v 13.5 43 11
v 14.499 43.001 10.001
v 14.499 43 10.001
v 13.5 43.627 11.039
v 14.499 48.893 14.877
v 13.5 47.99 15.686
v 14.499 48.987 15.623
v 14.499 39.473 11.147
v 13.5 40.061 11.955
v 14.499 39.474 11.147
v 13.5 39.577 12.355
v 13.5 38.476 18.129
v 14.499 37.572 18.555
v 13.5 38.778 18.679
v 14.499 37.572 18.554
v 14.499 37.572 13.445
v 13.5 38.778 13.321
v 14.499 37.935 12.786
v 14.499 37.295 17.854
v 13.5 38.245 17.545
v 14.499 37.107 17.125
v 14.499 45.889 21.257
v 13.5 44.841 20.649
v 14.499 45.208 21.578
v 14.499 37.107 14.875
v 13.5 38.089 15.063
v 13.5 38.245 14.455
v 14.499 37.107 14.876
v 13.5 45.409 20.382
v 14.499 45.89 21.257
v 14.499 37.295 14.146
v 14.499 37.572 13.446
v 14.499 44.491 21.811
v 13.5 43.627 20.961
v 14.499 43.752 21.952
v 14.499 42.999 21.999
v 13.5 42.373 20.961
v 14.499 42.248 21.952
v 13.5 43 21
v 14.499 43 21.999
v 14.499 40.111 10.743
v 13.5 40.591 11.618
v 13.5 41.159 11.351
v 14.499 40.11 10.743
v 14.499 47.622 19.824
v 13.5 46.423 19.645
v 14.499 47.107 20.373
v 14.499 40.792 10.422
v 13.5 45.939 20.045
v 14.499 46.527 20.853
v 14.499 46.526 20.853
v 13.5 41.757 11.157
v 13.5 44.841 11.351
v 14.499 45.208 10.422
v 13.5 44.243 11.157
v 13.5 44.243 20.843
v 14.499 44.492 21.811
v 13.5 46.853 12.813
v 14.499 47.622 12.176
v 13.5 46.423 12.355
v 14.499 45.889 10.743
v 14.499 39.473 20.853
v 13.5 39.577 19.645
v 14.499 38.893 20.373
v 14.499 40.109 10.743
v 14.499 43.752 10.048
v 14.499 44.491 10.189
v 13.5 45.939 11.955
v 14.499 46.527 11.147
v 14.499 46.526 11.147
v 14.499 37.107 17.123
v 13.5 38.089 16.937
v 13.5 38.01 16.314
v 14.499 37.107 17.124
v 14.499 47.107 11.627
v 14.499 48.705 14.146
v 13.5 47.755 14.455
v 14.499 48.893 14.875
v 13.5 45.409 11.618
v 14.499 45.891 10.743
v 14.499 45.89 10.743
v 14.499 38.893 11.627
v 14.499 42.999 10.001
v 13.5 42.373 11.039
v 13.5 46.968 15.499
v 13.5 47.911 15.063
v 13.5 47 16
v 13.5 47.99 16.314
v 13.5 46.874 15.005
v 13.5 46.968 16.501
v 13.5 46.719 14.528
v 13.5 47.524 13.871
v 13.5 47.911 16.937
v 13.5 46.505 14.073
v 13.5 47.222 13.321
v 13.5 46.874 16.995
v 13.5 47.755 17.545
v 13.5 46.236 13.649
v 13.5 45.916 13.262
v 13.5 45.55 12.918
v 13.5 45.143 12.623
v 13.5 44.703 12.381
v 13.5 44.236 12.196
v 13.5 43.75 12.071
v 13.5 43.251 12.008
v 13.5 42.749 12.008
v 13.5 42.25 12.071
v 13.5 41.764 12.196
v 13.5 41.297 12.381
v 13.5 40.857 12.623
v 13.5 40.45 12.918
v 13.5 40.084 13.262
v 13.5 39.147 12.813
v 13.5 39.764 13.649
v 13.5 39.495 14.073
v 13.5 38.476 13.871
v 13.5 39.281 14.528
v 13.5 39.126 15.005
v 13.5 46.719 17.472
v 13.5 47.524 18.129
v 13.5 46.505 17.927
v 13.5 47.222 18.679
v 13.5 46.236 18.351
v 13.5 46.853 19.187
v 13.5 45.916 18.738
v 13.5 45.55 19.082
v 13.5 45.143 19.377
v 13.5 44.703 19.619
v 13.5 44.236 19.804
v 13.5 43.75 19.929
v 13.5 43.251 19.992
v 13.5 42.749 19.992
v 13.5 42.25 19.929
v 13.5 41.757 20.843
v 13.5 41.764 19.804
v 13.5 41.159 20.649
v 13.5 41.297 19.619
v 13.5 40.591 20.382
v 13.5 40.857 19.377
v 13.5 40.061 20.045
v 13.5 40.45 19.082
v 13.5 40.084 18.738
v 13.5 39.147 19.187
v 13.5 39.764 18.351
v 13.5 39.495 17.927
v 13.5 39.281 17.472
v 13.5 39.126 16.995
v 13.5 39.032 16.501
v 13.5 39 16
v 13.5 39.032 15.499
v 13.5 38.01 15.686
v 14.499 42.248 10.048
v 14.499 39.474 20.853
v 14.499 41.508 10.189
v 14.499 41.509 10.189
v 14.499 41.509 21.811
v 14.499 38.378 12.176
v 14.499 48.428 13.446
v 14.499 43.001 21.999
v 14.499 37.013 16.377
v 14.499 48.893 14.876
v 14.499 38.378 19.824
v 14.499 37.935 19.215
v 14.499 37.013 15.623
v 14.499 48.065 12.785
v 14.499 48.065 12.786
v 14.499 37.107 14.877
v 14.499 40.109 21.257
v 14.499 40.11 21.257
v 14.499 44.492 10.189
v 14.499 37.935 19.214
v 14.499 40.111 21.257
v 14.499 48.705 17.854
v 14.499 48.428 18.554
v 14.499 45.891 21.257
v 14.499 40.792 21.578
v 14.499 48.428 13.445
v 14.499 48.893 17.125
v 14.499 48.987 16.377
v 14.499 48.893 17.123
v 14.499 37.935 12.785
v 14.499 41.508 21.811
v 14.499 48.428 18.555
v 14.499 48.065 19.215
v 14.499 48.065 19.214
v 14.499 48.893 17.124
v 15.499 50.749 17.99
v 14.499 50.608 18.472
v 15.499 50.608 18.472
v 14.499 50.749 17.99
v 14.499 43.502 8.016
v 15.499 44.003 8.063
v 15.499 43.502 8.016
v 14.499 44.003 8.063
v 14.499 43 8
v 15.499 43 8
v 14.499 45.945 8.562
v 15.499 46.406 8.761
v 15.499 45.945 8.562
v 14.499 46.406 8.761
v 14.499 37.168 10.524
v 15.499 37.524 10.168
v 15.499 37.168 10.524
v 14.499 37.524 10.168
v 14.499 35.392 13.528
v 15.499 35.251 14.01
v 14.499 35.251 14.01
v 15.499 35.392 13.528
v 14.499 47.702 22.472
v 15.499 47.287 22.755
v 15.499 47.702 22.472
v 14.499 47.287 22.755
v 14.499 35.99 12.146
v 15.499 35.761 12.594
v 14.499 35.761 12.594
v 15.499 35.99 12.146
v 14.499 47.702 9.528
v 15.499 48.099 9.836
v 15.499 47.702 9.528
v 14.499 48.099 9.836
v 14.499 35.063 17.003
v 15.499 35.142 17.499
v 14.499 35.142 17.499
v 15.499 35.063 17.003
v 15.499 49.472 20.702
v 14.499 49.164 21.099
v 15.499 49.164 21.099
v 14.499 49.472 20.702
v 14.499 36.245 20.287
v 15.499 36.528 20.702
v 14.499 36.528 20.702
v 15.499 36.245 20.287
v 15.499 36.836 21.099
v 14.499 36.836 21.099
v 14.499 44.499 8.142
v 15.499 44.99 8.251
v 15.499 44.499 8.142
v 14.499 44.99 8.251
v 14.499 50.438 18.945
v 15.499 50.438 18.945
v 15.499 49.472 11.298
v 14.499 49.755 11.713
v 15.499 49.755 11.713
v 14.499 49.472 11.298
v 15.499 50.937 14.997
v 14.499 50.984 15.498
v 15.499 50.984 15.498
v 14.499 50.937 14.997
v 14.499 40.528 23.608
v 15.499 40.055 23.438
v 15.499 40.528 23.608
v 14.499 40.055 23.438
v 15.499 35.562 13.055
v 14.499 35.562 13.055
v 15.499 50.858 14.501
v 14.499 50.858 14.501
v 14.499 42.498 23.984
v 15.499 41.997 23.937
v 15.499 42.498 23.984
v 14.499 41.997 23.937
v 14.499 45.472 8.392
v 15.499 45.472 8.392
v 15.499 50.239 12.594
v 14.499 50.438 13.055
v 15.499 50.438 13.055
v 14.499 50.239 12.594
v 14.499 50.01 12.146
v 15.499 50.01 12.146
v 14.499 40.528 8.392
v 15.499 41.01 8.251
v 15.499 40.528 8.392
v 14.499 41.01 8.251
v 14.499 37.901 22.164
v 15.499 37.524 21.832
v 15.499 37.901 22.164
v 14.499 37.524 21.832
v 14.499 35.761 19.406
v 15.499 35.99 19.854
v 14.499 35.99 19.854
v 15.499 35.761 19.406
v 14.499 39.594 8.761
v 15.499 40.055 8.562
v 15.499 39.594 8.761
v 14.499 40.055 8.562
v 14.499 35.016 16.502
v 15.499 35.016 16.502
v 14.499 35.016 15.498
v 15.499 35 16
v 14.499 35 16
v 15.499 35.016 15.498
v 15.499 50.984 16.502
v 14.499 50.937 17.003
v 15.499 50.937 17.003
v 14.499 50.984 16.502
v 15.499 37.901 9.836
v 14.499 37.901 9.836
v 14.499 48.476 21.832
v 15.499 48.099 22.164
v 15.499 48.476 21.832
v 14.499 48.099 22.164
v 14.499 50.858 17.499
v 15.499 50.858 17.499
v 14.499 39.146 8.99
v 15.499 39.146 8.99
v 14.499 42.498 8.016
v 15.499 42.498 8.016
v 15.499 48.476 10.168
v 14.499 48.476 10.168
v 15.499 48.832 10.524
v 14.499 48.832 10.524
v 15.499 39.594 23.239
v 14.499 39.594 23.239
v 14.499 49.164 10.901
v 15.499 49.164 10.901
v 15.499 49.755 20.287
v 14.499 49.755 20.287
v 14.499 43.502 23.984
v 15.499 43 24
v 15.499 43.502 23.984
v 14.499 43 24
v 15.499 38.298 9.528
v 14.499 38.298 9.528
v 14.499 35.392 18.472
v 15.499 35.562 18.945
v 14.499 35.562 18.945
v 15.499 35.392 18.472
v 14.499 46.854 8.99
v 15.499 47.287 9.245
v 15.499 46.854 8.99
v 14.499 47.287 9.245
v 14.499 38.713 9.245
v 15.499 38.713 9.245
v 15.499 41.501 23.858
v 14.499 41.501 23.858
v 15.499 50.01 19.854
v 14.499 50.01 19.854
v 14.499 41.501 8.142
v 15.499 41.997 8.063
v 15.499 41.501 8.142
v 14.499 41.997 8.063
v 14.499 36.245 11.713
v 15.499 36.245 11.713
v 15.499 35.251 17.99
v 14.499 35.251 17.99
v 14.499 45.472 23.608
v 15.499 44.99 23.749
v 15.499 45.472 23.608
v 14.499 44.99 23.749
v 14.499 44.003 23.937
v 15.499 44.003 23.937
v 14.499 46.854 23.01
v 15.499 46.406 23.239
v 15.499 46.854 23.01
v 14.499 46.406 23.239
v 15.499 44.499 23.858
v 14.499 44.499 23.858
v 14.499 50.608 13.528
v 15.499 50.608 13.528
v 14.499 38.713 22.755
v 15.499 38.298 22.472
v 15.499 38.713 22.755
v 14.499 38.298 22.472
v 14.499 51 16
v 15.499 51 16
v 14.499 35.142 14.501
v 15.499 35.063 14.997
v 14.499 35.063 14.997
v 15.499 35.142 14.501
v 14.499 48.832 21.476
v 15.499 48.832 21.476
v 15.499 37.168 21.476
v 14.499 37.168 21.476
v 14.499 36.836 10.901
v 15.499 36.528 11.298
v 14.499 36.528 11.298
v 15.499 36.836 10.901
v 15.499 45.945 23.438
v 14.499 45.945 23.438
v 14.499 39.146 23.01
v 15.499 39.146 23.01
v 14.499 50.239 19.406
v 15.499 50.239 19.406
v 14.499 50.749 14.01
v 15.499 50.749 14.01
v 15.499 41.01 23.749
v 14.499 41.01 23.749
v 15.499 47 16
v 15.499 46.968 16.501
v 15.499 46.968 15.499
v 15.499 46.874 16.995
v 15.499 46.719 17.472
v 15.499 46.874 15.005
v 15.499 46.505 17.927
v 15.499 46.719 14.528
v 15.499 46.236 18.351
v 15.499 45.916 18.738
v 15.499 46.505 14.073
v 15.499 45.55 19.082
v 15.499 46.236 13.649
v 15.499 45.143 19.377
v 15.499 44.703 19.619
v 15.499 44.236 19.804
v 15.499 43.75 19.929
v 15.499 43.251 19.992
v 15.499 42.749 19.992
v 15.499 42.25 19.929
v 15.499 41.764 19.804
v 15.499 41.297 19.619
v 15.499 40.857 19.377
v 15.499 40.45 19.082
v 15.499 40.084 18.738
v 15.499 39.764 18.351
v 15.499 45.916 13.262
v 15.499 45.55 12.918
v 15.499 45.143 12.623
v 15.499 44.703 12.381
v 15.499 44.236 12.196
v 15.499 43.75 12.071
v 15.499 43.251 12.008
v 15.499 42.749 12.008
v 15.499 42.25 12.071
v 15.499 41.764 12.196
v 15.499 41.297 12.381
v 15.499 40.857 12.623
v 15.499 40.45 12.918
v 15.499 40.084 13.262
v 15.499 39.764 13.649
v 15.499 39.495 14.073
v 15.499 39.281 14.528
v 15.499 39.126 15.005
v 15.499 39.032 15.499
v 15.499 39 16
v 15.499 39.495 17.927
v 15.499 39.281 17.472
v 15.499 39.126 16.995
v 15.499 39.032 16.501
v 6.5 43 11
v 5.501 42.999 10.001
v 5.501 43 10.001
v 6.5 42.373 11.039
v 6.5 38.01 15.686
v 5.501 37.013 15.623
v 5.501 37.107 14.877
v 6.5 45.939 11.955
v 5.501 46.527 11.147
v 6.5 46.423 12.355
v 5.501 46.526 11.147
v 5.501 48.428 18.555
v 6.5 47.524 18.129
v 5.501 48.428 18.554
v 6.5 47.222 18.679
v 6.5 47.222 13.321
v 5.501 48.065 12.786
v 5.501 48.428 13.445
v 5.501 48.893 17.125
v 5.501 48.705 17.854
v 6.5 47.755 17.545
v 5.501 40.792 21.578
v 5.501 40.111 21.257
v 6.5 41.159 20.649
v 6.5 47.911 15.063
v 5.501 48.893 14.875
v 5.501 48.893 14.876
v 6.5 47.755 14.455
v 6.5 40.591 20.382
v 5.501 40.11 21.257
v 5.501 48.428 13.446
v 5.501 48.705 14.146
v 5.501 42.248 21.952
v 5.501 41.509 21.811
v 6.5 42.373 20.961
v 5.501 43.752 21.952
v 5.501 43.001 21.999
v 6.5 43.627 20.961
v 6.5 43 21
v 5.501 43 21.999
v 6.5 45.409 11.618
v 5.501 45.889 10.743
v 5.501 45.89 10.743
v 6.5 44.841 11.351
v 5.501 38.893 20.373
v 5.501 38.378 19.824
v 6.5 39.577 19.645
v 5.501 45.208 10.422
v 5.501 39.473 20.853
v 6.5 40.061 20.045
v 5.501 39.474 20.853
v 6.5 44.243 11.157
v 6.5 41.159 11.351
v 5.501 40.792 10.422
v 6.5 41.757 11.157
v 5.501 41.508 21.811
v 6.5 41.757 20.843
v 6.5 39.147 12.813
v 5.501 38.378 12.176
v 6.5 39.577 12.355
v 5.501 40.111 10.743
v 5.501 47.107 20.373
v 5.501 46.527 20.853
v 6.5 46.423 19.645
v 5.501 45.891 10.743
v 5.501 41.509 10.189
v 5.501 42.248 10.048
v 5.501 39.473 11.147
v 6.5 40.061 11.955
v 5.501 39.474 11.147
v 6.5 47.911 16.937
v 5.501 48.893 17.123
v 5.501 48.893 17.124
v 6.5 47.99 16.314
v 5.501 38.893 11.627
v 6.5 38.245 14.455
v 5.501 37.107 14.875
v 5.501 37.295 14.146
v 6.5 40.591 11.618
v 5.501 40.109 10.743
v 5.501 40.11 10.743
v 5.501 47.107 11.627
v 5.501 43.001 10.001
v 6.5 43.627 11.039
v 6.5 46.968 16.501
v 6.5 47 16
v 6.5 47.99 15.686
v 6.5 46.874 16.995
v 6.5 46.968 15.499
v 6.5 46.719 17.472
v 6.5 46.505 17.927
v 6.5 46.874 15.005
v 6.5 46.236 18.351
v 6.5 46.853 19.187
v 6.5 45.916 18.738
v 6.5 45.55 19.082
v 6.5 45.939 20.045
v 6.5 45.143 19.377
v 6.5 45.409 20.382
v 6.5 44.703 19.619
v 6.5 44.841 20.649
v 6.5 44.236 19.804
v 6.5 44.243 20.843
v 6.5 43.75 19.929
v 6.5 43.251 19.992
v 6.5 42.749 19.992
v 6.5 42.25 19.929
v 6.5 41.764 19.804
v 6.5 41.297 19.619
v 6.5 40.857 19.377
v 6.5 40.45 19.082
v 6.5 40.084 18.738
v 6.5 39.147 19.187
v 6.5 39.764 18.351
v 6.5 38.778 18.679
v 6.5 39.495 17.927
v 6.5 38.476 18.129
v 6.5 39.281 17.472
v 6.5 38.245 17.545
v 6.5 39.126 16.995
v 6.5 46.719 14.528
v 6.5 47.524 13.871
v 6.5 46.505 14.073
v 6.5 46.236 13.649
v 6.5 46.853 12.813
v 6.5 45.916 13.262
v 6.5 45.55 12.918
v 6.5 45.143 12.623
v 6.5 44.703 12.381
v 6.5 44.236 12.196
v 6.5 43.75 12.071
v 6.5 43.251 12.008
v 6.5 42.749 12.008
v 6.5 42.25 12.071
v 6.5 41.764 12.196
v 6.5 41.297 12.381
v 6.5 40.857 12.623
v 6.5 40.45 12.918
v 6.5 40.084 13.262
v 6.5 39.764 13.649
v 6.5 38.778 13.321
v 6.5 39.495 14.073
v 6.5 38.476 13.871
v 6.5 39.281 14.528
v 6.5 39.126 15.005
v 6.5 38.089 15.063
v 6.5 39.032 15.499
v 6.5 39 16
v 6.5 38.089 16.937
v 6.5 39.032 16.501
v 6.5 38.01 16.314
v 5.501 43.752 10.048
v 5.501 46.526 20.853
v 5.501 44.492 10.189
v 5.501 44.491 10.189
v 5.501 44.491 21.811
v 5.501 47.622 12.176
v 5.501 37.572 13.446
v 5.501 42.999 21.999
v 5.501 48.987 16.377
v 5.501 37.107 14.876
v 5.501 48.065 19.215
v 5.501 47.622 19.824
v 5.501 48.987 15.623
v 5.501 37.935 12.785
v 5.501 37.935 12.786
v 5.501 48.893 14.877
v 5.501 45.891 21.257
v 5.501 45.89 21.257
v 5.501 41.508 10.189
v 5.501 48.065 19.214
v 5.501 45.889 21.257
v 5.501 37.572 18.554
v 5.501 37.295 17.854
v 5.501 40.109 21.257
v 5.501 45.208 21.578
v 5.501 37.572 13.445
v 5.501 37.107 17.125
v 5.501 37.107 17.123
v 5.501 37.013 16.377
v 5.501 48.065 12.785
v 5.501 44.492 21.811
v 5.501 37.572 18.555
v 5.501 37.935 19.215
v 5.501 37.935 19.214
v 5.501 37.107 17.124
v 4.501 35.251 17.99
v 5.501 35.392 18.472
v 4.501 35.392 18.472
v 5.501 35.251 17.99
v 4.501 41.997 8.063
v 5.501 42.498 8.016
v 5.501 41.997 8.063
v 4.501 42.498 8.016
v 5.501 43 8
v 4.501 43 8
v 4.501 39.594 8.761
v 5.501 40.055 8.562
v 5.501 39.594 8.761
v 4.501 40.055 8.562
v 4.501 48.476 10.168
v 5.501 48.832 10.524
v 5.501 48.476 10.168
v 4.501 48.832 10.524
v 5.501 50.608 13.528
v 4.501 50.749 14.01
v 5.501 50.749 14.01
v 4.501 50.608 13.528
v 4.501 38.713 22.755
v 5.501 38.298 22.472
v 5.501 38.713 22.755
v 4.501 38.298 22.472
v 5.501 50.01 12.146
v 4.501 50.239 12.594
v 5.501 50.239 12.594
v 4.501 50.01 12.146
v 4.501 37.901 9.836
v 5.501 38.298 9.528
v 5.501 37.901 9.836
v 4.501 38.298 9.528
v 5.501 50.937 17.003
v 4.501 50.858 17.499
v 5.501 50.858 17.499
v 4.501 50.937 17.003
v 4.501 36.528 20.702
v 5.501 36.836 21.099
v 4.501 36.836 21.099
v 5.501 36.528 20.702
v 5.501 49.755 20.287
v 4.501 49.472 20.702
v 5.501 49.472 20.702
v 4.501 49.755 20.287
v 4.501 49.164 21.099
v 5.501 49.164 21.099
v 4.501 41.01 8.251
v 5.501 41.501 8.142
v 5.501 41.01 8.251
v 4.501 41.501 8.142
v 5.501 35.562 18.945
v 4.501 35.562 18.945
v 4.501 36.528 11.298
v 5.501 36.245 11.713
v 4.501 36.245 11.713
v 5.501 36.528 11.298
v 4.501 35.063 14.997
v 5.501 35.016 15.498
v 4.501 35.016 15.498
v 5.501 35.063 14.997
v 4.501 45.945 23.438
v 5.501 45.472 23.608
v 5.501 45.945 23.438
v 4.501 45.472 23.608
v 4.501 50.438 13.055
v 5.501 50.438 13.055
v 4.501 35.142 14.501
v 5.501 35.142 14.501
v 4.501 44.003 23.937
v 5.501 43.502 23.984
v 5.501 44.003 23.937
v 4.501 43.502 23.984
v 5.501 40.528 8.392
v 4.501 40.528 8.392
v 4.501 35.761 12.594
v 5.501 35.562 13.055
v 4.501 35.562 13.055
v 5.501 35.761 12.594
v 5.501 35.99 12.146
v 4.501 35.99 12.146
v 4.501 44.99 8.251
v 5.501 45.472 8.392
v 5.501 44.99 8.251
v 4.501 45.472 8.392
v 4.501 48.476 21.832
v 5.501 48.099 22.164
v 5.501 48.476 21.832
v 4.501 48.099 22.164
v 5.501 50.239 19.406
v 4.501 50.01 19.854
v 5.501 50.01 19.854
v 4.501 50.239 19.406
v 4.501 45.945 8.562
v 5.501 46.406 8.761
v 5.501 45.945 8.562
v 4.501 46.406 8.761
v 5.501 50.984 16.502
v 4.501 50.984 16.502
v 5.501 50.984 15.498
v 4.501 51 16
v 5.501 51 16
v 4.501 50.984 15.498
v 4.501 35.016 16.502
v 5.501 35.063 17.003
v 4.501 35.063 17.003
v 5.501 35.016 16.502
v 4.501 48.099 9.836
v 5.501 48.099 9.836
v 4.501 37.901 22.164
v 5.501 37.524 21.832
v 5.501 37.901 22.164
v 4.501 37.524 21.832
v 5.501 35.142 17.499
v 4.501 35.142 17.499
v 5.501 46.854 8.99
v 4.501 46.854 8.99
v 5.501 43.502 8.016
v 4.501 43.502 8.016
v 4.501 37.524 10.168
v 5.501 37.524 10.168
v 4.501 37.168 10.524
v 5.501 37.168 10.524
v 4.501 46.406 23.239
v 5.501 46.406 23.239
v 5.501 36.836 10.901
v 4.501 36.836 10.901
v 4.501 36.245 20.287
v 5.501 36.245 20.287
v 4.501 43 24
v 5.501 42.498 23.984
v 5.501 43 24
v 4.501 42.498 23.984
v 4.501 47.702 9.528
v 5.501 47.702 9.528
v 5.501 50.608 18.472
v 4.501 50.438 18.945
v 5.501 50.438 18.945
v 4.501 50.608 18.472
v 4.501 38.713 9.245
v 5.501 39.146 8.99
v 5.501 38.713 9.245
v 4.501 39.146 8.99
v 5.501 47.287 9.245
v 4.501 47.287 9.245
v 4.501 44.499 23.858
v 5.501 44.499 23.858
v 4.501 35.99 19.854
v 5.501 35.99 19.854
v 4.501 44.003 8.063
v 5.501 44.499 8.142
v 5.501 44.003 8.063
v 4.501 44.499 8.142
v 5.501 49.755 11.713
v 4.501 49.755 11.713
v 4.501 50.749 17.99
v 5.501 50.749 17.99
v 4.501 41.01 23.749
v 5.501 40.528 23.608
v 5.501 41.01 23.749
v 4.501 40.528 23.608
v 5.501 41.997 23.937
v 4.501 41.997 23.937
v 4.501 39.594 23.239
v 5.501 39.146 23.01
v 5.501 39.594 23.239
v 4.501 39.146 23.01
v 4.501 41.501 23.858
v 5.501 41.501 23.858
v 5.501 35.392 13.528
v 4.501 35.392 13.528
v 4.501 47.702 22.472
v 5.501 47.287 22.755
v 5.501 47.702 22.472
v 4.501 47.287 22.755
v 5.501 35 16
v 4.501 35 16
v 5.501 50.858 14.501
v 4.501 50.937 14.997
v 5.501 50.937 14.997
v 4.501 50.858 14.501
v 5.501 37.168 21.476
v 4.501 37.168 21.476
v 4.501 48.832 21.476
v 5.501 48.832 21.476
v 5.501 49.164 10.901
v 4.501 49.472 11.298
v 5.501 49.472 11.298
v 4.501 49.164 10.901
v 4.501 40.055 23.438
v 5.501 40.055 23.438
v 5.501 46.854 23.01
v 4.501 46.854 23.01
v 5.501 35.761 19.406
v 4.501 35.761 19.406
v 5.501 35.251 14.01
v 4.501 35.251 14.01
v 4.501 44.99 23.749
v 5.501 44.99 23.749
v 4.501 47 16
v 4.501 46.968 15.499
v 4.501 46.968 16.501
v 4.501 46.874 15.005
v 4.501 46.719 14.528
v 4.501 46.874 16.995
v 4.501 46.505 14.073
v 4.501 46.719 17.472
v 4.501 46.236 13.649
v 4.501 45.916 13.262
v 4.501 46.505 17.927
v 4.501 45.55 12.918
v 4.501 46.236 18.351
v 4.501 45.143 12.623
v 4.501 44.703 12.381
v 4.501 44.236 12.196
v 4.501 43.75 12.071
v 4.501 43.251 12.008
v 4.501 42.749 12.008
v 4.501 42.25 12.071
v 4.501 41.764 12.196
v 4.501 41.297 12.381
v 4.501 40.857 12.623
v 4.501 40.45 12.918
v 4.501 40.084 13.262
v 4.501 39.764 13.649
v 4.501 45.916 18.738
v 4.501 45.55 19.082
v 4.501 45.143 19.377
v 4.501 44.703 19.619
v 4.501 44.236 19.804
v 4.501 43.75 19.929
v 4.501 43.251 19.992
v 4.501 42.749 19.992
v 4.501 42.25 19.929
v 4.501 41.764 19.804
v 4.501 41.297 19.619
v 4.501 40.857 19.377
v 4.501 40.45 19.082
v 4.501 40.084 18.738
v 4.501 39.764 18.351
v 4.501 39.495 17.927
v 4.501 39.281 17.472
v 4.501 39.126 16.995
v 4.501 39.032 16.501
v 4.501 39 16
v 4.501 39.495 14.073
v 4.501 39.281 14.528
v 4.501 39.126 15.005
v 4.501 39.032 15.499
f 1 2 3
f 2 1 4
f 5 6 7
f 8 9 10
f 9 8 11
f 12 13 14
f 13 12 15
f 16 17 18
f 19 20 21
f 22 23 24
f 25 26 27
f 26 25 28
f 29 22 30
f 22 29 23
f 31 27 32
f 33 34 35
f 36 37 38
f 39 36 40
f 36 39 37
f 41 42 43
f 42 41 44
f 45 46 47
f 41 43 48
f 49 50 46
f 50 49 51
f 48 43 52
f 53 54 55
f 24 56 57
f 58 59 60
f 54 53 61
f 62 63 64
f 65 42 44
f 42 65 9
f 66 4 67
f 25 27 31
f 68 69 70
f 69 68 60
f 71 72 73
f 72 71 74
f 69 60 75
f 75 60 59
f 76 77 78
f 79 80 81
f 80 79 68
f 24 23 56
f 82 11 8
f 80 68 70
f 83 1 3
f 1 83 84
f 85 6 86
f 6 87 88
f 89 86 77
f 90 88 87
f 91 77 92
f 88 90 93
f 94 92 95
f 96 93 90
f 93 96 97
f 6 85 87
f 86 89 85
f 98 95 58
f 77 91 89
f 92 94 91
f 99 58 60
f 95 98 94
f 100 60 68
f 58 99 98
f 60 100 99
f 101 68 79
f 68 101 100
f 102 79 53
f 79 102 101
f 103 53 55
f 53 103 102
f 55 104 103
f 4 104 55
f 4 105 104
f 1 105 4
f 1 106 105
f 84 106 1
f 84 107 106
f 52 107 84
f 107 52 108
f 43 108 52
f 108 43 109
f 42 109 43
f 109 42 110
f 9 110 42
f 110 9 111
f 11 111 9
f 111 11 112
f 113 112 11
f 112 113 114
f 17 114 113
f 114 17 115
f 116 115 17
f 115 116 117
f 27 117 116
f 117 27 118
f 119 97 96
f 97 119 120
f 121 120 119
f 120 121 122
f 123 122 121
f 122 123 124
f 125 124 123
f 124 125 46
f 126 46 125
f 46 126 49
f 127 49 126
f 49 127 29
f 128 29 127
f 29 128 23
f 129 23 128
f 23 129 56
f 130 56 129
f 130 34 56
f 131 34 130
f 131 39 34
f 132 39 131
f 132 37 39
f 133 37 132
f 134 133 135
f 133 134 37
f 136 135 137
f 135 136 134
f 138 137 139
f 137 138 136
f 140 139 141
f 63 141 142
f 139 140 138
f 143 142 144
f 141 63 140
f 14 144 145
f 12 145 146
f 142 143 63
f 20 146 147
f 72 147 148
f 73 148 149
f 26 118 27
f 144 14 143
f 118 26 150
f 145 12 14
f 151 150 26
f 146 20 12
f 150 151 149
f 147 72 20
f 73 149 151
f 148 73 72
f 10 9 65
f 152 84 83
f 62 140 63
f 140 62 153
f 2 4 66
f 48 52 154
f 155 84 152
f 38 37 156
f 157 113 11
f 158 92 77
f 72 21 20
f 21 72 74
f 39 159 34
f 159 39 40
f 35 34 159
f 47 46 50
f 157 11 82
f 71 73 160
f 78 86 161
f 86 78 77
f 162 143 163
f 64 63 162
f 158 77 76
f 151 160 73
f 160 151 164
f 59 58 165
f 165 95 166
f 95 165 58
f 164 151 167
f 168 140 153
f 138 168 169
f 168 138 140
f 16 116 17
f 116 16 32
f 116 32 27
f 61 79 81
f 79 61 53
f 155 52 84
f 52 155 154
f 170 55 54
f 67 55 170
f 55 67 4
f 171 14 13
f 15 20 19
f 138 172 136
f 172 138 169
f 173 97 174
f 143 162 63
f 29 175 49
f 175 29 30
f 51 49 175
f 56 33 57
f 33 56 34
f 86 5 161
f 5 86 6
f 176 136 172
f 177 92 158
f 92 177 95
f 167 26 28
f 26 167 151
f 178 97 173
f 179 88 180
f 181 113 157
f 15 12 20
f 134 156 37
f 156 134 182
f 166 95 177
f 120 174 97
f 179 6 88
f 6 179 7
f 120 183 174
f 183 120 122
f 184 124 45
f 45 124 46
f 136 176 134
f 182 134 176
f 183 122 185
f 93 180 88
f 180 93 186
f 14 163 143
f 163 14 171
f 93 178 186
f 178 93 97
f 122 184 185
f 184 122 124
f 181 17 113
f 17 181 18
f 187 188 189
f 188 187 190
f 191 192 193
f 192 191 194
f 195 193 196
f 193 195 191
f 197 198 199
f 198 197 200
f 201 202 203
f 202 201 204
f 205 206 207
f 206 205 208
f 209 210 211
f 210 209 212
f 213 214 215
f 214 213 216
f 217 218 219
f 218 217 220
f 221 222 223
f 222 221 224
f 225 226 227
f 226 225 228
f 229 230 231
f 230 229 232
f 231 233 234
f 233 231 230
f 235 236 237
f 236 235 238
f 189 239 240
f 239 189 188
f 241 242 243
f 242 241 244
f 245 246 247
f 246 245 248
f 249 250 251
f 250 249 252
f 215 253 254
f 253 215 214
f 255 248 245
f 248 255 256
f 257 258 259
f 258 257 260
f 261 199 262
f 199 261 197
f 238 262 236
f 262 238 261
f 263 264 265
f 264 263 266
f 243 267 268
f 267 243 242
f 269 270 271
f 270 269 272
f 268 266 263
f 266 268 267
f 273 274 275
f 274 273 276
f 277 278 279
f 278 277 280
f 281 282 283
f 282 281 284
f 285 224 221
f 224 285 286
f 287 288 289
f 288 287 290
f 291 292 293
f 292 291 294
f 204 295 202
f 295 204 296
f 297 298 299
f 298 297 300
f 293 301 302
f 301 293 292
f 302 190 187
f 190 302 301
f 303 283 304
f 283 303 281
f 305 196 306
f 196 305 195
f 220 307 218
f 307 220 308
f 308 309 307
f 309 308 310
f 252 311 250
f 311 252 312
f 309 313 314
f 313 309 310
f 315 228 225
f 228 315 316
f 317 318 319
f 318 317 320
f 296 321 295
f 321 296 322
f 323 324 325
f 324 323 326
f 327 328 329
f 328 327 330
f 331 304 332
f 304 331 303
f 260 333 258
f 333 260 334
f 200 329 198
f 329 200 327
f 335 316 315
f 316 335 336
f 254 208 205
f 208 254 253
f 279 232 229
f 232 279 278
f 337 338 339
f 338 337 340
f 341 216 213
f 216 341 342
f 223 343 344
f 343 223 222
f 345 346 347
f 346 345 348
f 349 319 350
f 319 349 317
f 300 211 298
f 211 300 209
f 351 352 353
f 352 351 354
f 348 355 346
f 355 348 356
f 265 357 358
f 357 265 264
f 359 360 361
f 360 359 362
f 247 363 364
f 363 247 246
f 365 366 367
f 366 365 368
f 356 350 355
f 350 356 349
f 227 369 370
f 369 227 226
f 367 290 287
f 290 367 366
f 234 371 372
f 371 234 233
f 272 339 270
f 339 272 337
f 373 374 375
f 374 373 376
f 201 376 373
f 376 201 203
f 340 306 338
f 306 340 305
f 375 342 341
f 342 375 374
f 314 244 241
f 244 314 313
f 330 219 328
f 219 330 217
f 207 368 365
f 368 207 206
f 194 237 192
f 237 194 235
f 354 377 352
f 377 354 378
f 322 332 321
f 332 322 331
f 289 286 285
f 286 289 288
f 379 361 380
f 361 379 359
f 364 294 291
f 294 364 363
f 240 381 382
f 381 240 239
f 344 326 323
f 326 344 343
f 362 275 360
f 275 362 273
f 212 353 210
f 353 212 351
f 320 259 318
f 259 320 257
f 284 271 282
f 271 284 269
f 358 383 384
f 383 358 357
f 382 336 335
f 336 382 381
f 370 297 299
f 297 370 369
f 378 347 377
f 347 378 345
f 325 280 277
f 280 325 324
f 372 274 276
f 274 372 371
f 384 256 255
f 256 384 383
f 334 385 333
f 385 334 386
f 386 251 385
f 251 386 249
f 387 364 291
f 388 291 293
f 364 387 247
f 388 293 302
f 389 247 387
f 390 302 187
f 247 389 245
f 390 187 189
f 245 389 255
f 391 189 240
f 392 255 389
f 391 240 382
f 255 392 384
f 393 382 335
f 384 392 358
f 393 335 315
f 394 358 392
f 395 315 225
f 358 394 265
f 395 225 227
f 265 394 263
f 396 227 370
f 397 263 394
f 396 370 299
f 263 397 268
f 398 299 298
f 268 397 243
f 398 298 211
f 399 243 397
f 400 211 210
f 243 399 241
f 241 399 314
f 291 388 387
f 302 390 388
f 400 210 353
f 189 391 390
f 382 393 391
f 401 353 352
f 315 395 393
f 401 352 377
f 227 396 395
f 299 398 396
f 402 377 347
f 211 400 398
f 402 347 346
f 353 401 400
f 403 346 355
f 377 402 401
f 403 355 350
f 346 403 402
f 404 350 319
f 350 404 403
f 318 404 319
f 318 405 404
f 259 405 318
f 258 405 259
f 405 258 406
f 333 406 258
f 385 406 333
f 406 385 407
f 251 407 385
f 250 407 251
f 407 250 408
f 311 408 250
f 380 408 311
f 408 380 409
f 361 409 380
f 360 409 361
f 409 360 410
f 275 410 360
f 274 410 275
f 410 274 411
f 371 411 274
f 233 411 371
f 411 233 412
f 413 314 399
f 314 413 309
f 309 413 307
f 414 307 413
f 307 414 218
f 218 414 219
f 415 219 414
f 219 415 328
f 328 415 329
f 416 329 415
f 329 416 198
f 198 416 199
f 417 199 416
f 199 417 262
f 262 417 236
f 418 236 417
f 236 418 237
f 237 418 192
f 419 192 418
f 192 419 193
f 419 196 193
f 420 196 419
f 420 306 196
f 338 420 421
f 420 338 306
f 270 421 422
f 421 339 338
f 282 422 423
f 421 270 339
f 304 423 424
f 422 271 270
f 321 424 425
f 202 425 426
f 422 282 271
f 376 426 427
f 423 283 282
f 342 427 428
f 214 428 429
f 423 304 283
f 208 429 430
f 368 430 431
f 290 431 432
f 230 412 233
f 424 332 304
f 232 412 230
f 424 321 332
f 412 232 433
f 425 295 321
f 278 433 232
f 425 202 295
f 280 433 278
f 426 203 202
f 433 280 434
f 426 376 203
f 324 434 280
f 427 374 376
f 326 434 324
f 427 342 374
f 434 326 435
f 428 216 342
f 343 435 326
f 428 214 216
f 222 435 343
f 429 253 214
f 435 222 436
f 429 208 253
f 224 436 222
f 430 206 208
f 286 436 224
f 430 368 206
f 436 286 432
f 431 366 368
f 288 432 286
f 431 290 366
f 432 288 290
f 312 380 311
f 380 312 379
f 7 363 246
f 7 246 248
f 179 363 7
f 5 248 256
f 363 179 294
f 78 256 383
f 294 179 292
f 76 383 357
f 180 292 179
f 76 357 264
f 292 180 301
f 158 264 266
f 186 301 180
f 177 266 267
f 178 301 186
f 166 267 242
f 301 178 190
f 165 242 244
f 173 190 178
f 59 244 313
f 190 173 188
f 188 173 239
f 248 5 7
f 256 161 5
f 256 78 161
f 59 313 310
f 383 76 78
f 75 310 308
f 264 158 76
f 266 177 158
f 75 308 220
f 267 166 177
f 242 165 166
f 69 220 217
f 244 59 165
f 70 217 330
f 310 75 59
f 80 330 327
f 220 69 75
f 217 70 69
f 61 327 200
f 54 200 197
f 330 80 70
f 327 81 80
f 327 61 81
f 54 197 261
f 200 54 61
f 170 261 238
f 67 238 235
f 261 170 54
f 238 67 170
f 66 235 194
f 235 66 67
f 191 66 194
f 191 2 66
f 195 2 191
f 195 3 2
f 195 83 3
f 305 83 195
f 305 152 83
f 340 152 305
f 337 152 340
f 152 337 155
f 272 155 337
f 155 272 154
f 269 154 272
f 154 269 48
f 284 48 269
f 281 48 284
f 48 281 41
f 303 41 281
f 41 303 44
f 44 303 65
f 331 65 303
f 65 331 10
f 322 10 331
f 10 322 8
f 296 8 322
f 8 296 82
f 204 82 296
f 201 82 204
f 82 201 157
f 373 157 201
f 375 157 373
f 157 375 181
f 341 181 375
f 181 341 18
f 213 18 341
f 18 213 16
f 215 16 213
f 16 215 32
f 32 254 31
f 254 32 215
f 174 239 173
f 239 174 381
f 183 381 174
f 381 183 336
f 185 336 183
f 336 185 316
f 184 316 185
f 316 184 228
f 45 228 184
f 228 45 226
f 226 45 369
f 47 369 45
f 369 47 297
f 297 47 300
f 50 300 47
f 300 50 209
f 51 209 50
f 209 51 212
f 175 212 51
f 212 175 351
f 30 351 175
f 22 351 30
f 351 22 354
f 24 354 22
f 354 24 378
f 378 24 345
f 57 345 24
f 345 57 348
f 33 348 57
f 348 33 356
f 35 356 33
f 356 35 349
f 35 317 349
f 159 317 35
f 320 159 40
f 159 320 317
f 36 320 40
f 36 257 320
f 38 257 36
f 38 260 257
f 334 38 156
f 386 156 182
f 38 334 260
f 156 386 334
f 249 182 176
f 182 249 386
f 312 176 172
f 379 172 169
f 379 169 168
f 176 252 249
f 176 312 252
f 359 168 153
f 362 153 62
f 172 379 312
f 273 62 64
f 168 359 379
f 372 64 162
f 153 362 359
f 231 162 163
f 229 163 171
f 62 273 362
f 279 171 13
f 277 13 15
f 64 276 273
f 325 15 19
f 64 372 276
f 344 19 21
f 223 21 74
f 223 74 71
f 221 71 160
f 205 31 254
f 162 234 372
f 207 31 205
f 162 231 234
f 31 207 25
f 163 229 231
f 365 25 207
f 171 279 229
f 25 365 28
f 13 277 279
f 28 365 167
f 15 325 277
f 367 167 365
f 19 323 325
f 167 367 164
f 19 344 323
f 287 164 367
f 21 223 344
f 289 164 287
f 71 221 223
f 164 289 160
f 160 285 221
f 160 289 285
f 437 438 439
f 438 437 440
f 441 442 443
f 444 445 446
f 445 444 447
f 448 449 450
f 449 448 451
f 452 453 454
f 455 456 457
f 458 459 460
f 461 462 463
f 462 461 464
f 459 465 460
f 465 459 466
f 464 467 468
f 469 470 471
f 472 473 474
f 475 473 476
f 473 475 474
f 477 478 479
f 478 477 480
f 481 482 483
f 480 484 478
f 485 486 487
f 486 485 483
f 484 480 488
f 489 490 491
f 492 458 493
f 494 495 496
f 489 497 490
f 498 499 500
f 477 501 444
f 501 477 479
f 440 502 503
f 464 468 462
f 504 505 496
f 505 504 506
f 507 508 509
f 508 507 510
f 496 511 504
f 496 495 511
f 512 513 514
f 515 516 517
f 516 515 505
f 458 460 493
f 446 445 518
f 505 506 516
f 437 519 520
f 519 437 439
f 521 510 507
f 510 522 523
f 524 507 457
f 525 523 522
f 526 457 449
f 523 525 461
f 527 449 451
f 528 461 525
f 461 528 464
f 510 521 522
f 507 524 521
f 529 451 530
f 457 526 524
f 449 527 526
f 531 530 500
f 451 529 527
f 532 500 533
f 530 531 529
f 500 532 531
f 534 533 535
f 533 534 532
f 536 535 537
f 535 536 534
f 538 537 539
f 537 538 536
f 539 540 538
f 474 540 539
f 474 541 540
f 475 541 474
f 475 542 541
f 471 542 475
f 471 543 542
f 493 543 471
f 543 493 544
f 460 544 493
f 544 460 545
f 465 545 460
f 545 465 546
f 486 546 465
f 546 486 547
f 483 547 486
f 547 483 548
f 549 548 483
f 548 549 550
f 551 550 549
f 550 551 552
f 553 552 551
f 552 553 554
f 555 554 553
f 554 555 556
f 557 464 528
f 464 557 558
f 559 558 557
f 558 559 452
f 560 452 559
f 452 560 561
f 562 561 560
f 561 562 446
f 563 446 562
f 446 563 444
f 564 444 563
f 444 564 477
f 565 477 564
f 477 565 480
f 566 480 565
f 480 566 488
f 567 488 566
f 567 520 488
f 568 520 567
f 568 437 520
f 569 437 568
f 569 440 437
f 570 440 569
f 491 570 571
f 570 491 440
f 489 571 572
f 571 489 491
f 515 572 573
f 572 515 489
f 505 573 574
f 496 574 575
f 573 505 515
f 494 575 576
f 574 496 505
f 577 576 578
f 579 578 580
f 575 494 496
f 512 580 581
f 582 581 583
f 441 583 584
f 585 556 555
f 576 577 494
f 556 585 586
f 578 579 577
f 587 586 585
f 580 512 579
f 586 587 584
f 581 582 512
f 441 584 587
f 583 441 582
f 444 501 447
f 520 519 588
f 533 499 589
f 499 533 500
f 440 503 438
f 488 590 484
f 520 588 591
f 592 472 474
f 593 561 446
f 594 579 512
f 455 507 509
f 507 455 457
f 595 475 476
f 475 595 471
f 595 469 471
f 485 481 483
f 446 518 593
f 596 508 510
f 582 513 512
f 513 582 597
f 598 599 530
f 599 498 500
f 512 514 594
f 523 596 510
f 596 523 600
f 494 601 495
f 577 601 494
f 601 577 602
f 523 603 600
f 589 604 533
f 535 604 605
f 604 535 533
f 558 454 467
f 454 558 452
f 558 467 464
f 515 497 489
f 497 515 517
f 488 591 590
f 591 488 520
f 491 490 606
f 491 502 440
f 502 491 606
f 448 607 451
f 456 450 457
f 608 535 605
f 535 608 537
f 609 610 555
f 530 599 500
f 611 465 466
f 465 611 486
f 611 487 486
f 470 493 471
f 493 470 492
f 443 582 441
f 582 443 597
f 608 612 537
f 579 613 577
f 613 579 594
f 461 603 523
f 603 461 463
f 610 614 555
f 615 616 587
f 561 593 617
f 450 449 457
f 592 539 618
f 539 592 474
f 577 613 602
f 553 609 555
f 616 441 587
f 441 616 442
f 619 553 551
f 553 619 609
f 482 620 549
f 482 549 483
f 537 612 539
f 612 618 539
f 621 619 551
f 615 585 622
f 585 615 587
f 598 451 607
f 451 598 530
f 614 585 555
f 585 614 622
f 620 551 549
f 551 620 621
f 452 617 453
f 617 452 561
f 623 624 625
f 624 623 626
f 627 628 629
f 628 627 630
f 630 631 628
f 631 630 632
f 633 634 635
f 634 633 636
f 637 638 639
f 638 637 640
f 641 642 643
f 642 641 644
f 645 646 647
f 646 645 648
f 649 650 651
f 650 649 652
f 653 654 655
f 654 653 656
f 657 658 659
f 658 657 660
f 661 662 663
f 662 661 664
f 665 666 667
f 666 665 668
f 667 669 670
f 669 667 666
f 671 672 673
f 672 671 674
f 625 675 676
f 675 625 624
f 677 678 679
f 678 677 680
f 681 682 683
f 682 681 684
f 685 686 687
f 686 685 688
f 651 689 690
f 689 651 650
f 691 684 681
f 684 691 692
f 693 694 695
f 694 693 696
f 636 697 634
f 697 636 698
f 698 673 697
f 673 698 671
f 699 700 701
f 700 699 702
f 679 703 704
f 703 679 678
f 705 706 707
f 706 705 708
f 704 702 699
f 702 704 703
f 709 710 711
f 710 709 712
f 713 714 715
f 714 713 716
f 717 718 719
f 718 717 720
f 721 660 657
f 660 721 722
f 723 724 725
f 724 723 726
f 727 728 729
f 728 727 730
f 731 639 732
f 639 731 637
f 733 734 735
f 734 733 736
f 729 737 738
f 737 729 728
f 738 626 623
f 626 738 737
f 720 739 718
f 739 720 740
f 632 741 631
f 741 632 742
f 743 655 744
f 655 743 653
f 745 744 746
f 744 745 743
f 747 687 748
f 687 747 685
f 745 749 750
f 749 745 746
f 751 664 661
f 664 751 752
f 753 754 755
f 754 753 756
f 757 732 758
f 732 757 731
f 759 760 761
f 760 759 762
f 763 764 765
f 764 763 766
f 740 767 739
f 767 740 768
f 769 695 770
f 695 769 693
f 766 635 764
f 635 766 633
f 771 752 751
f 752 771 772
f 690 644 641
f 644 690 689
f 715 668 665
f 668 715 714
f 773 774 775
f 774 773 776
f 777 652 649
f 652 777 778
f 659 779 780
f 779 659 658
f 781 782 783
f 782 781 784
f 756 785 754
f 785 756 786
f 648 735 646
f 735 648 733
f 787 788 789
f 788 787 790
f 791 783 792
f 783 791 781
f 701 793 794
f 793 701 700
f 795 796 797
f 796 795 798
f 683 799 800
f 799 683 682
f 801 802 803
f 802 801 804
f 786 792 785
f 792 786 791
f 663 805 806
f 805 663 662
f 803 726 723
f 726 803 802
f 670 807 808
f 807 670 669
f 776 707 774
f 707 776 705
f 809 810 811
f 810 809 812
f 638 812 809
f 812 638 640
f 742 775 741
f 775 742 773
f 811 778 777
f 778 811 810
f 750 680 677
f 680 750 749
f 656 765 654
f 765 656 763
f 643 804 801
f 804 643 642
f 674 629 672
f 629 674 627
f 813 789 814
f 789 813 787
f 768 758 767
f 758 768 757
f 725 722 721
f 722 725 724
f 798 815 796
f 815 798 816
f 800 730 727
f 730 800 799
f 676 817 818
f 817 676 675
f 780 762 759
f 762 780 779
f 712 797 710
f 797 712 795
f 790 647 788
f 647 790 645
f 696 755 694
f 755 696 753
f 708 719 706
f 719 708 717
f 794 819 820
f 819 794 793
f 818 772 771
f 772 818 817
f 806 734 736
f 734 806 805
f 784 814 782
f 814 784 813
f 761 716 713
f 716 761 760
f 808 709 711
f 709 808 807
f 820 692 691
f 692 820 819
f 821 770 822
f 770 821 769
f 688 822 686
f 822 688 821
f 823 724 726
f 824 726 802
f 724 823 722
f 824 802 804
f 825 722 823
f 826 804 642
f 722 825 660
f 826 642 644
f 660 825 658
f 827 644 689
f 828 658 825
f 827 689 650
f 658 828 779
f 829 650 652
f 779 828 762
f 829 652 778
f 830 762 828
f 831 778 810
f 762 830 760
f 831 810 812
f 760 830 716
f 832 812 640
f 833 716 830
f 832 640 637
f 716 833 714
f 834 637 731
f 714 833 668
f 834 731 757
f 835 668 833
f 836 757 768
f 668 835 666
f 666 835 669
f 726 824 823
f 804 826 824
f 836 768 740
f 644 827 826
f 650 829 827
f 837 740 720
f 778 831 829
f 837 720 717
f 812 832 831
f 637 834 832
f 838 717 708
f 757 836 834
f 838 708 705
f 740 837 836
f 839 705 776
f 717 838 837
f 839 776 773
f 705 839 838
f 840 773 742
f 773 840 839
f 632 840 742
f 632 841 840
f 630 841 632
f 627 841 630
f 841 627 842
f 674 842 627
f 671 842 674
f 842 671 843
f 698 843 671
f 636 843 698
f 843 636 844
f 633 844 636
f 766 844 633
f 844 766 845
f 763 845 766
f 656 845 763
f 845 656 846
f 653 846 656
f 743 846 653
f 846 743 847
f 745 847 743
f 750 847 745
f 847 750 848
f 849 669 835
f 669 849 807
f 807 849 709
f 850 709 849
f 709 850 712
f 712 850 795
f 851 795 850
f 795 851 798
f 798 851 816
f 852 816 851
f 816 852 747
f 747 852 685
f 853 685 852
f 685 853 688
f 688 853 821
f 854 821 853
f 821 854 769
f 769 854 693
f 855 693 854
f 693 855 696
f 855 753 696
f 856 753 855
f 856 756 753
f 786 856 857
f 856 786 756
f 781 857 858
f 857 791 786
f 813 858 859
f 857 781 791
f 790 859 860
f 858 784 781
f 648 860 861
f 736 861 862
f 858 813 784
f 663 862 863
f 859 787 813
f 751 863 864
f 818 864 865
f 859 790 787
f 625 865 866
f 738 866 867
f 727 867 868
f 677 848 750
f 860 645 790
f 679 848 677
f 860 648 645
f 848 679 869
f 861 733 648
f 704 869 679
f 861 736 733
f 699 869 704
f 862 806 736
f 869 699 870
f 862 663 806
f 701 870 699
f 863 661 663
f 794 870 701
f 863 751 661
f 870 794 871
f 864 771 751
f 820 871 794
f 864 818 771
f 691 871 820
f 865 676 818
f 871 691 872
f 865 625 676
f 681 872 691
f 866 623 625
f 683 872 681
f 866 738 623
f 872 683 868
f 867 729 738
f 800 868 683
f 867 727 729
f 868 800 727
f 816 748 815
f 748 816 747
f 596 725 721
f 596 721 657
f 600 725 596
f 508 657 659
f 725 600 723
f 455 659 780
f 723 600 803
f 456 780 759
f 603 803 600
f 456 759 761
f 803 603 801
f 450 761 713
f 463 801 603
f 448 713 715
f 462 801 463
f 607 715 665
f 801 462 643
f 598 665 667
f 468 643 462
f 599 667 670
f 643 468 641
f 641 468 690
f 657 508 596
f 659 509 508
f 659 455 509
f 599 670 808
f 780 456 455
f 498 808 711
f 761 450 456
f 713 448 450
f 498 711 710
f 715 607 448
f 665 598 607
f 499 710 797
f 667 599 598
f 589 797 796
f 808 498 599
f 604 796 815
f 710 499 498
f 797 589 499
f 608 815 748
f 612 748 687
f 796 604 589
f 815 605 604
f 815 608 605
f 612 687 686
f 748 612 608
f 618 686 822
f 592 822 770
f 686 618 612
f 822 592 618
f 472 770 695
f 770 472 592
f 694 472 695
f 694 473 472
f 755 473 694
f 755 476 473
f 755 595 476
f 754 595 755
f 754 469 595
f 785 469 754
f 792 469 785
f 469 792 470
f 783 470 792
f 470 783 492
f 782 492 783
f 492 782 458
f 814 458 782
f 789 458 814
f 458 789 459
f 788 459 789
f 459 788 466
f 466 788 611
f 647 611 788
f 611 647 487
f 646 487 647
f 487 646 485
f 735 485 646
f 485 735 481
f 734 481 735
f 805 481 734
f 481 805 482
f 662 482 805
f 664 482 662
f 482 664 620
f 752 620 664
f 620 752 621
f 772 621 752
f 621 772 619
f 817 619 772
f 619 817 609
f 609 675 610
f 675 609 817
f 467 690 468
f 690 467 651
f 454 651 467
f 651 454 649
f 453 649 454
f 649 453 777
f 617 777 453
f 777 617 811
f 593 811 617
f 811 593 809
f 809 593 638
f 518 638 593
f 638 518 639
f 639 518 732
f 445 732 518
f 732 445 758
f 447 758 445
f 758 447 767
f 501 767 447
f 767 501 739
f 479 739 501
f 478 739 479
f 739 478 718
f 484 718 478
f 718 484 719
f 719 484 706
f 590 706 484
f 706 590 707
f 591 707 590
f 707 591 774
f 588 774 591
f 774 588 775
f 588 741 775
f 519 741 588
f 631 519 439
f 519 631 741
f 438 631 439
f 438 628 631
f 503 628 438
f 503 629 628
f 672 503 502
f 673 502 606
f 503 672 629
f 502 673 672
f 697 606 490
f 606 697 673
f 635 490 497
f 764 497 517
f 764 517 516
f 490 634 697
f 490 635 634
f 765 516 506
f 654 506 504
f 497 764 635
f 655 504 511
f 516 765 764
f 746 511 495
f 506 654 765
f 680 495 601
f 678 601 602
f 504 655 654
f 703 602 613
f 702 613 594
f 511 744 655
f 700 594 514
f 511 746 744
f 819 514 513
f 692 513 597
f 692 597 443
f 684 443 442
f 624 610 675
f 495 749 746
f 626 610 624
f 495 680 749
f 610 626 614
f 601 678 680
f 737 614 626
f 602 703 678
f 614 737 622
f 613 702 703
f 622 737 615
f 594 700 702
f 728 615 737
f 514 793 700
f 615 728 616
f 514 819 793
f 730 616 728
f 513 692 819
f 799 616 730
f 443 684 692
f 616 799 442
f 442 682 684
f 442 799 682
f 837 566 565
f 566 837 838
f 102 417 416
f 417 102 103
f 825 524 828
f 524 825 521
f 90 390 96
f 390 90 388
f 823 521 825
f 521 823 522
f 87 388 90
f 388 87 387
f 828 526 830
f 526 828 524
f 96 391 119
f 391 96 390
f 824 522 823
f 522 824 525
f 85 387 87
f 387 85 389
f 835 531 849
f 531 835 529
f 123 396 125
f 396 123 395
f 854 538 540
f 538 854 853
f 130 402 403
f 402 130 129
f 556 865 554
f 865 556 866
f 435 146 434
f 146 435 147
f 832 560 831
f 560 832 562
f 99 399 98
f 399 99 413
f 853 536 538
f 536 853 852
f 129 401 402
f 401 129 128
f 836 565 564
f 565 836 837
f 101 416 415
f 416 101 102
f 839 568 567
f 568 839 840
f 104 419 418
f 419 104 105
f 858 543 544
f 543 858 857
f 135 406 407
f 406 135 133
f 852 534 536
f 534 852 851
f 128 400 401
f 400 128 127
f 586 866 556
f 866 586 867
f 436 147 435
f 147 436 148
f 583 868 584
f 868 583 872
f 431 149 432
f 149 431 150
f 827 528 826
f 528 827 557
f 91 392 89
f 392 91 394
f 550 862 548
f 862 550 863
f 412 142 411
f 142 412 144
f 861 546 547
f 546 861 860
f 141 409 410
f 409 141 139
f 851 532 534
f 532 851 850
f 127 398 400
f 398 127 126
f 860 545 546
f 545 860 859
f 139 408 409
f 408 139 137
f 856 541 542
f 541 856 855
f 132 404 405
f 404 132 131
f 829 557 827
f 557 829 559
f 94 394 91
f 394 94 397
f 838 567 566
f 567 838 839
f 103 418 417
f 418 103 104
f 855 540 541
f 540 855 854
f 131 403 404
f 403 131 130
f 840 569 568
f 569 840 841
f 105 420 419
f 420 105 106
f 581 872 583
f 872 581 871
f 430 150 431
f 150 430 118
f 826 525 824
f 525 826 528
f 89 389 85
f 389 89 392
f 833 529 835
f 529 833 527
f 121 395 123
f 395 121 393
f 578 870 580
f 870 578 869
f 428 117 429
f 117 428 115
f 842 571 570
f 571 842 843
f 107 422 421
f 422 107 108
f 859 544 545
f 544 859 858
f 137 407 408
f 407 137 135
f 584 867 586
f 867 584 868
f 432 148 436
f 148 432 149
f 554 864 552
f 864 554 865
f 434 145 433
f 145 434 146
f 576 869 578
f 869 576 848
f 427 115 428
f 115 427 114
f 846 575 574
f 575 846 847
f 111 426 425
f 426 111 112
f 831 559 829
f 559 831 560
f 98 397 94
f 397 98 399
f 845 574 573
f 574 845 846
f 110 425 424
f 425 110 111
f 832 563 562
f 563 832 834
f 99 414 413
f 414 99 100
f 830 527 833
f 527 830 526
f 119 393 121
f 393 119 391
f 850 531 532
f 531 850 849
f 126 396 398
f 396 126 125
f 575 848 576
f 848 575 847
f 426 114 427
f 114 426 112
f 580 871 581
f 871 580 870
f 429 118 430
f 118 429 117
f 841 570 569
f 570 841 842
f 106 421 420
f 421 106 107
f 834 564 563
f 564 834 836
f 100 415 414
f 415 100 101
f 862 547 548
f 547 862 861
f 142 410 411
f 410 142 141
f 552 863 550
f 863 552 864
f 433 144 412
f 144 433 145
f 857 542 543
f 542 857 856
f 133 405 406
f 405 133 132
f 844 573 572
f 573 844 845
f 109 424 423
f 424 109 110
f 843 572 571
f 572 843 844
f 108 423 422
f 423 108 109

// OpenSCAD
/*
Projet ReprapJeanne

Fixation basse des axes de l'imprimante.
Version plus petite (moins long à imprimer)

github: https://github.com/gnieark/reprapJeanne
wiki https://mail.jeannedhack.org/wicked/display.php?page=reprap_geante

By Gnieark https://blog-du-grouik.tinad.fr
& TranKILLoman   

License GNU-GPL V3

*/

linear_extrude (height=4.01)
	import (file="all.dxf", layer="foot-profil-0-4", $fn=100);

difference(){
	union(){
		translate([0,0,4])
			linear_extrude (height=23)
				import (file="all.dxf", layer="foot-profil-4-40", $fn=100);
		translate([13.5,43,16])
			rotate([0,90,0])
				unCone();
		translate([6.5,43,16])
			rotate([180,90,0])
				unCone();
	}
	union(){
		translate([0,43,16])
			rotate([90,0,90])
				cylinder(r=4,$fn=50, h=20);
		difference(){
			translate([-10,43,16])rotate([90,0,90]) cylinder(r=20,h=40,$fn=50);
			union(){
				translate([-11,43,16]) rotate([90,0,90]) cylinder(r=11.1,h=42,$fn=100);
				translate([-11,13,0]) cube([42,30,30]);
				translate([-11,40,0]) cube([42,30,16]);
			}
		}
	}
}

module unCone(){
	cylinder (r1=5, r2=6, h=1, $fn=50);
 	translate([0,0,0.999]) cylinder (r=8, h=1, $fn=100);
}
